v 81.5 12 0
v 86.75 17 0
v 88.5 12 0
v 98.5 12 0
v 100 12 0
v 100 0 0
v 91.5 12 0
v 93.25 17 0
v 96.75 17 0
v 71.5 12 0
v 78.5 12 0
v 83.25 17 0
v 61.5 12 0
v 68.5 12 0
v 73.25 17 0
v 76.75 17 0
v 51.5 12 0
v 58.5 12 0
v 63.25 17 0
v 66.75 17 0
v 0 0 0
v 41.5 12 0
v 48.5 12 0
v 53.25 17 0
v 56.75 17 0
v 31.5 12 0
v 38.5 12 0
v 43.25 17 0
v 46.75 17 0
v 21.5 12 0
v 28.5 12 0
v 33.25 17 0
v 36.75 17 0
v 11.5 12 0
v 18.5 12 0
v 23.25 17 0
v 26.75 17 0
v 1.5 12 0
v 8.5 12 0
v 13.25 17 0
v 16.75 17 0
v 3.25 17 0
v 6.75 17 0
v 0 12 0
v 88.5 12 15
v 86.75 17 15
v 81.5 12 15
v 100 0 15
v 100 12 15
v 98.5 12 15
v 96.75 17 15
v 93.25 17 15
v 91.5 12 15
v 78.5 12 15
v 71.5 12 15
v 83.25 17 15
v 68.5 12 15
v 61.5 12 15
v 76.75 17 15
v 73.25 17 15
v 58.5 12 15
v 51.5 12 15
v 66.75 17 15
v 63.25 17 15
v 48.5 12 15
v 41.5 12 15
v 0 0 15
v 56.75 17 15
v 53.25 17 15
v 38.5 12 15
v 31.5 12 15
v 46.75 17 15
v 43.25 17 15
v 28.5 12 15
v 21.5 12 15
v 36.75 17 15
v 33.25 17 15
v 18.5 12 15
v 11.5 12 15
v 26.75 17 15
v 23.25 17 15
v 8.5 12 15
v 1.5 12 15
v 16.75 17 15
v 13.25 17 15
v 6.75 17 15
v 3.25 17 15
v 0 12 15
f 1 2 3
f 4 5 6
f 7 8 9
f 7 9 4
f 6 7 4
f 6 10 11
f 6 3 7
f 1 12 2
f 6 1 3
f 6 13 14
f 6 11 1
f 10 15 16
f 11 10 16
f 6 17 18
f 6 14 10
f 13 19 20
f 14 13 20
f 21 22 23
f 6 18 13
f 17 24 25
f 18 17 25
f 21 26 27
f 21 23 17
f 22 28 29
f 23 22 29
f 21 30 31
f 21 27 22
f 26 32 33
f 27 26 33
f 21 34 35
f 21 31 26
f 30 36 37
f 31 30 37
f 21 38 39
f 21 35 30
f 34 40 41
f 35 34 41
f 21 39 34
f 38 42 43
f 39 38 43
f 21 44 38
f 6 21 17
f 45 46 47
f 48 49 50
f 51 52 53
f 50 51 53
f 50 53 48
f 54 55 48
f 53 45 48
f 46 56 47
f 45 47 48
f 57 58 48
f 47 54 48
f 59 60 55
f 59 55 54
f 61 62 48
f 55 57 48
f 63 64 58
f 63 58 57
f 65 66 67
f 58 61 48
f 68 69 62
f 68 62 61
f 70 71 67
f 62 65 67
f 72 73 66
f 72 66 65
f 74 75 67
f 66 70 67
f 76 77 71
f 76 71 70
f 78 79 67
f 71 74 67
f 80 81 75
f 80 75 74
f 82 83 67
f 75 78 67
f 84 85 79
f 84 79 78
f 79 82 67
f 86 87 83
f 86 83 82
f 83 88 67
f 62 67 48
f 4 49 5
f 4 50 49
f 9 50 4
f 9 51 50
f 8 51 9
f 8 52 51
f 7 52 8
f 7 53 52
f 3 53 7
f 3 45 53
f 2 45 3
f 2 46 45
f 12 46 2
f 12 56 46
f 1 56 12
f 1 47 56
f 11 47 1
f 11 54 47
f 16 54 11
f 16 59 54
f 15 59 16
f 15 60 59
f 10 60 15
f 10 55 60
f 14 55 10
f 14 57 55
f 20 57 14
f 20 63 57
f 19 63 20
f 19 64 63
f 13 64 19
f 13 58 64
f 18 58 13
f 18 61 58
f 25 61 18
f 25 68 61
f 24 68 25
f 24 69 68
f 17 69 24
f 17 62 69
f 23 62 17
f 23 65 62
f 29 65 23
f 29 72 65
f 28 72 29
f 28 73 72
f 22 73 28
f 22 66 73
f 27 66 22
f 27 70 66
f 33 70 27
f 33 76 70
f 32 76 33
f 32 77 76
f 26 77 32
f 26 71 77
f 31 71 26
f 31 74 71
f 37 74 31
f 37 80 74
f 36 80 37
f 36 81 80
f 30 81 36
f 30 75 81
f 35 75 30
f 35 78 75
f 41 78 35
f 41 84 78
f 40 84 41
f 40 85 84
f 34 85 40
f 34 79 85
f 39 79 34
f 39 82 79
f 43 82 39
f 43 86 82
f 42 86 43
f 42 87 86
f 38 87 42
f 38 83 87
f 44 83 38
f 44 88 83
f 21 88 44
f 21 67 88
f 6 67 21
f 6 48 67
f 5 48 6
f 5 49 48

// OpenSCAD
$fn = 32;

// ----------------------------------------------------------------------
// Gear rack: 10 teeth, pitch 10 mm
// ----------------------------------------------------------------------

// --- parameters (mm) ---
teeth = 10;               // number of teeth
pitch = 10;               // tooth pitch, X
root_w = 7;               // tooth width at the root
tip_w = 3.5;              // tooth width at the tip
base_h = 12;              // rack body height, Y
tooth_h = 5;              // tooth height above the body
plate_t = 15;             // rack width, Z (extrusion height)

rack_l = teeth * pitch;  // overall length
total_h = base_h + tooth_h;  // overall height

profile = [[0, 0], [100, 0], [100, 12], [98.5, 12], [96.75, 17], [93.25, 17], [91.5, 12], [88.5, 12], [86.75, 17], [83.25, 17], [81.5, 12], [78.5, 12], [76.75, 17], [73.25, 17], [71.5, 12], [68.5, 12], [66.75, 17], [63.25, 17], [61.5, 12], [58.5, 12], [56.75, 17], [53.25, 17], [51.5, 12], [48.5, 12], [46.75, 17], [43.25, 17], [41.5, 12], [38.5, 12], [36.75, 17], [33.25, 17], [31.5, 12], [28.5, 12], [26.75, 17], [23.25, 17], [21.5, 12], [18.5, 12], [16.75, 17], [13.25, 17], [11.5, 12], [8.5, 12], [6.75, 17], [3.25, 17], [1.5, 12], [0, 12]];  // primary outline, 44 points, counter clockwise

// --- the one profile operation ---
linear_extrude(height = plate_t) polygon(points = profile);
